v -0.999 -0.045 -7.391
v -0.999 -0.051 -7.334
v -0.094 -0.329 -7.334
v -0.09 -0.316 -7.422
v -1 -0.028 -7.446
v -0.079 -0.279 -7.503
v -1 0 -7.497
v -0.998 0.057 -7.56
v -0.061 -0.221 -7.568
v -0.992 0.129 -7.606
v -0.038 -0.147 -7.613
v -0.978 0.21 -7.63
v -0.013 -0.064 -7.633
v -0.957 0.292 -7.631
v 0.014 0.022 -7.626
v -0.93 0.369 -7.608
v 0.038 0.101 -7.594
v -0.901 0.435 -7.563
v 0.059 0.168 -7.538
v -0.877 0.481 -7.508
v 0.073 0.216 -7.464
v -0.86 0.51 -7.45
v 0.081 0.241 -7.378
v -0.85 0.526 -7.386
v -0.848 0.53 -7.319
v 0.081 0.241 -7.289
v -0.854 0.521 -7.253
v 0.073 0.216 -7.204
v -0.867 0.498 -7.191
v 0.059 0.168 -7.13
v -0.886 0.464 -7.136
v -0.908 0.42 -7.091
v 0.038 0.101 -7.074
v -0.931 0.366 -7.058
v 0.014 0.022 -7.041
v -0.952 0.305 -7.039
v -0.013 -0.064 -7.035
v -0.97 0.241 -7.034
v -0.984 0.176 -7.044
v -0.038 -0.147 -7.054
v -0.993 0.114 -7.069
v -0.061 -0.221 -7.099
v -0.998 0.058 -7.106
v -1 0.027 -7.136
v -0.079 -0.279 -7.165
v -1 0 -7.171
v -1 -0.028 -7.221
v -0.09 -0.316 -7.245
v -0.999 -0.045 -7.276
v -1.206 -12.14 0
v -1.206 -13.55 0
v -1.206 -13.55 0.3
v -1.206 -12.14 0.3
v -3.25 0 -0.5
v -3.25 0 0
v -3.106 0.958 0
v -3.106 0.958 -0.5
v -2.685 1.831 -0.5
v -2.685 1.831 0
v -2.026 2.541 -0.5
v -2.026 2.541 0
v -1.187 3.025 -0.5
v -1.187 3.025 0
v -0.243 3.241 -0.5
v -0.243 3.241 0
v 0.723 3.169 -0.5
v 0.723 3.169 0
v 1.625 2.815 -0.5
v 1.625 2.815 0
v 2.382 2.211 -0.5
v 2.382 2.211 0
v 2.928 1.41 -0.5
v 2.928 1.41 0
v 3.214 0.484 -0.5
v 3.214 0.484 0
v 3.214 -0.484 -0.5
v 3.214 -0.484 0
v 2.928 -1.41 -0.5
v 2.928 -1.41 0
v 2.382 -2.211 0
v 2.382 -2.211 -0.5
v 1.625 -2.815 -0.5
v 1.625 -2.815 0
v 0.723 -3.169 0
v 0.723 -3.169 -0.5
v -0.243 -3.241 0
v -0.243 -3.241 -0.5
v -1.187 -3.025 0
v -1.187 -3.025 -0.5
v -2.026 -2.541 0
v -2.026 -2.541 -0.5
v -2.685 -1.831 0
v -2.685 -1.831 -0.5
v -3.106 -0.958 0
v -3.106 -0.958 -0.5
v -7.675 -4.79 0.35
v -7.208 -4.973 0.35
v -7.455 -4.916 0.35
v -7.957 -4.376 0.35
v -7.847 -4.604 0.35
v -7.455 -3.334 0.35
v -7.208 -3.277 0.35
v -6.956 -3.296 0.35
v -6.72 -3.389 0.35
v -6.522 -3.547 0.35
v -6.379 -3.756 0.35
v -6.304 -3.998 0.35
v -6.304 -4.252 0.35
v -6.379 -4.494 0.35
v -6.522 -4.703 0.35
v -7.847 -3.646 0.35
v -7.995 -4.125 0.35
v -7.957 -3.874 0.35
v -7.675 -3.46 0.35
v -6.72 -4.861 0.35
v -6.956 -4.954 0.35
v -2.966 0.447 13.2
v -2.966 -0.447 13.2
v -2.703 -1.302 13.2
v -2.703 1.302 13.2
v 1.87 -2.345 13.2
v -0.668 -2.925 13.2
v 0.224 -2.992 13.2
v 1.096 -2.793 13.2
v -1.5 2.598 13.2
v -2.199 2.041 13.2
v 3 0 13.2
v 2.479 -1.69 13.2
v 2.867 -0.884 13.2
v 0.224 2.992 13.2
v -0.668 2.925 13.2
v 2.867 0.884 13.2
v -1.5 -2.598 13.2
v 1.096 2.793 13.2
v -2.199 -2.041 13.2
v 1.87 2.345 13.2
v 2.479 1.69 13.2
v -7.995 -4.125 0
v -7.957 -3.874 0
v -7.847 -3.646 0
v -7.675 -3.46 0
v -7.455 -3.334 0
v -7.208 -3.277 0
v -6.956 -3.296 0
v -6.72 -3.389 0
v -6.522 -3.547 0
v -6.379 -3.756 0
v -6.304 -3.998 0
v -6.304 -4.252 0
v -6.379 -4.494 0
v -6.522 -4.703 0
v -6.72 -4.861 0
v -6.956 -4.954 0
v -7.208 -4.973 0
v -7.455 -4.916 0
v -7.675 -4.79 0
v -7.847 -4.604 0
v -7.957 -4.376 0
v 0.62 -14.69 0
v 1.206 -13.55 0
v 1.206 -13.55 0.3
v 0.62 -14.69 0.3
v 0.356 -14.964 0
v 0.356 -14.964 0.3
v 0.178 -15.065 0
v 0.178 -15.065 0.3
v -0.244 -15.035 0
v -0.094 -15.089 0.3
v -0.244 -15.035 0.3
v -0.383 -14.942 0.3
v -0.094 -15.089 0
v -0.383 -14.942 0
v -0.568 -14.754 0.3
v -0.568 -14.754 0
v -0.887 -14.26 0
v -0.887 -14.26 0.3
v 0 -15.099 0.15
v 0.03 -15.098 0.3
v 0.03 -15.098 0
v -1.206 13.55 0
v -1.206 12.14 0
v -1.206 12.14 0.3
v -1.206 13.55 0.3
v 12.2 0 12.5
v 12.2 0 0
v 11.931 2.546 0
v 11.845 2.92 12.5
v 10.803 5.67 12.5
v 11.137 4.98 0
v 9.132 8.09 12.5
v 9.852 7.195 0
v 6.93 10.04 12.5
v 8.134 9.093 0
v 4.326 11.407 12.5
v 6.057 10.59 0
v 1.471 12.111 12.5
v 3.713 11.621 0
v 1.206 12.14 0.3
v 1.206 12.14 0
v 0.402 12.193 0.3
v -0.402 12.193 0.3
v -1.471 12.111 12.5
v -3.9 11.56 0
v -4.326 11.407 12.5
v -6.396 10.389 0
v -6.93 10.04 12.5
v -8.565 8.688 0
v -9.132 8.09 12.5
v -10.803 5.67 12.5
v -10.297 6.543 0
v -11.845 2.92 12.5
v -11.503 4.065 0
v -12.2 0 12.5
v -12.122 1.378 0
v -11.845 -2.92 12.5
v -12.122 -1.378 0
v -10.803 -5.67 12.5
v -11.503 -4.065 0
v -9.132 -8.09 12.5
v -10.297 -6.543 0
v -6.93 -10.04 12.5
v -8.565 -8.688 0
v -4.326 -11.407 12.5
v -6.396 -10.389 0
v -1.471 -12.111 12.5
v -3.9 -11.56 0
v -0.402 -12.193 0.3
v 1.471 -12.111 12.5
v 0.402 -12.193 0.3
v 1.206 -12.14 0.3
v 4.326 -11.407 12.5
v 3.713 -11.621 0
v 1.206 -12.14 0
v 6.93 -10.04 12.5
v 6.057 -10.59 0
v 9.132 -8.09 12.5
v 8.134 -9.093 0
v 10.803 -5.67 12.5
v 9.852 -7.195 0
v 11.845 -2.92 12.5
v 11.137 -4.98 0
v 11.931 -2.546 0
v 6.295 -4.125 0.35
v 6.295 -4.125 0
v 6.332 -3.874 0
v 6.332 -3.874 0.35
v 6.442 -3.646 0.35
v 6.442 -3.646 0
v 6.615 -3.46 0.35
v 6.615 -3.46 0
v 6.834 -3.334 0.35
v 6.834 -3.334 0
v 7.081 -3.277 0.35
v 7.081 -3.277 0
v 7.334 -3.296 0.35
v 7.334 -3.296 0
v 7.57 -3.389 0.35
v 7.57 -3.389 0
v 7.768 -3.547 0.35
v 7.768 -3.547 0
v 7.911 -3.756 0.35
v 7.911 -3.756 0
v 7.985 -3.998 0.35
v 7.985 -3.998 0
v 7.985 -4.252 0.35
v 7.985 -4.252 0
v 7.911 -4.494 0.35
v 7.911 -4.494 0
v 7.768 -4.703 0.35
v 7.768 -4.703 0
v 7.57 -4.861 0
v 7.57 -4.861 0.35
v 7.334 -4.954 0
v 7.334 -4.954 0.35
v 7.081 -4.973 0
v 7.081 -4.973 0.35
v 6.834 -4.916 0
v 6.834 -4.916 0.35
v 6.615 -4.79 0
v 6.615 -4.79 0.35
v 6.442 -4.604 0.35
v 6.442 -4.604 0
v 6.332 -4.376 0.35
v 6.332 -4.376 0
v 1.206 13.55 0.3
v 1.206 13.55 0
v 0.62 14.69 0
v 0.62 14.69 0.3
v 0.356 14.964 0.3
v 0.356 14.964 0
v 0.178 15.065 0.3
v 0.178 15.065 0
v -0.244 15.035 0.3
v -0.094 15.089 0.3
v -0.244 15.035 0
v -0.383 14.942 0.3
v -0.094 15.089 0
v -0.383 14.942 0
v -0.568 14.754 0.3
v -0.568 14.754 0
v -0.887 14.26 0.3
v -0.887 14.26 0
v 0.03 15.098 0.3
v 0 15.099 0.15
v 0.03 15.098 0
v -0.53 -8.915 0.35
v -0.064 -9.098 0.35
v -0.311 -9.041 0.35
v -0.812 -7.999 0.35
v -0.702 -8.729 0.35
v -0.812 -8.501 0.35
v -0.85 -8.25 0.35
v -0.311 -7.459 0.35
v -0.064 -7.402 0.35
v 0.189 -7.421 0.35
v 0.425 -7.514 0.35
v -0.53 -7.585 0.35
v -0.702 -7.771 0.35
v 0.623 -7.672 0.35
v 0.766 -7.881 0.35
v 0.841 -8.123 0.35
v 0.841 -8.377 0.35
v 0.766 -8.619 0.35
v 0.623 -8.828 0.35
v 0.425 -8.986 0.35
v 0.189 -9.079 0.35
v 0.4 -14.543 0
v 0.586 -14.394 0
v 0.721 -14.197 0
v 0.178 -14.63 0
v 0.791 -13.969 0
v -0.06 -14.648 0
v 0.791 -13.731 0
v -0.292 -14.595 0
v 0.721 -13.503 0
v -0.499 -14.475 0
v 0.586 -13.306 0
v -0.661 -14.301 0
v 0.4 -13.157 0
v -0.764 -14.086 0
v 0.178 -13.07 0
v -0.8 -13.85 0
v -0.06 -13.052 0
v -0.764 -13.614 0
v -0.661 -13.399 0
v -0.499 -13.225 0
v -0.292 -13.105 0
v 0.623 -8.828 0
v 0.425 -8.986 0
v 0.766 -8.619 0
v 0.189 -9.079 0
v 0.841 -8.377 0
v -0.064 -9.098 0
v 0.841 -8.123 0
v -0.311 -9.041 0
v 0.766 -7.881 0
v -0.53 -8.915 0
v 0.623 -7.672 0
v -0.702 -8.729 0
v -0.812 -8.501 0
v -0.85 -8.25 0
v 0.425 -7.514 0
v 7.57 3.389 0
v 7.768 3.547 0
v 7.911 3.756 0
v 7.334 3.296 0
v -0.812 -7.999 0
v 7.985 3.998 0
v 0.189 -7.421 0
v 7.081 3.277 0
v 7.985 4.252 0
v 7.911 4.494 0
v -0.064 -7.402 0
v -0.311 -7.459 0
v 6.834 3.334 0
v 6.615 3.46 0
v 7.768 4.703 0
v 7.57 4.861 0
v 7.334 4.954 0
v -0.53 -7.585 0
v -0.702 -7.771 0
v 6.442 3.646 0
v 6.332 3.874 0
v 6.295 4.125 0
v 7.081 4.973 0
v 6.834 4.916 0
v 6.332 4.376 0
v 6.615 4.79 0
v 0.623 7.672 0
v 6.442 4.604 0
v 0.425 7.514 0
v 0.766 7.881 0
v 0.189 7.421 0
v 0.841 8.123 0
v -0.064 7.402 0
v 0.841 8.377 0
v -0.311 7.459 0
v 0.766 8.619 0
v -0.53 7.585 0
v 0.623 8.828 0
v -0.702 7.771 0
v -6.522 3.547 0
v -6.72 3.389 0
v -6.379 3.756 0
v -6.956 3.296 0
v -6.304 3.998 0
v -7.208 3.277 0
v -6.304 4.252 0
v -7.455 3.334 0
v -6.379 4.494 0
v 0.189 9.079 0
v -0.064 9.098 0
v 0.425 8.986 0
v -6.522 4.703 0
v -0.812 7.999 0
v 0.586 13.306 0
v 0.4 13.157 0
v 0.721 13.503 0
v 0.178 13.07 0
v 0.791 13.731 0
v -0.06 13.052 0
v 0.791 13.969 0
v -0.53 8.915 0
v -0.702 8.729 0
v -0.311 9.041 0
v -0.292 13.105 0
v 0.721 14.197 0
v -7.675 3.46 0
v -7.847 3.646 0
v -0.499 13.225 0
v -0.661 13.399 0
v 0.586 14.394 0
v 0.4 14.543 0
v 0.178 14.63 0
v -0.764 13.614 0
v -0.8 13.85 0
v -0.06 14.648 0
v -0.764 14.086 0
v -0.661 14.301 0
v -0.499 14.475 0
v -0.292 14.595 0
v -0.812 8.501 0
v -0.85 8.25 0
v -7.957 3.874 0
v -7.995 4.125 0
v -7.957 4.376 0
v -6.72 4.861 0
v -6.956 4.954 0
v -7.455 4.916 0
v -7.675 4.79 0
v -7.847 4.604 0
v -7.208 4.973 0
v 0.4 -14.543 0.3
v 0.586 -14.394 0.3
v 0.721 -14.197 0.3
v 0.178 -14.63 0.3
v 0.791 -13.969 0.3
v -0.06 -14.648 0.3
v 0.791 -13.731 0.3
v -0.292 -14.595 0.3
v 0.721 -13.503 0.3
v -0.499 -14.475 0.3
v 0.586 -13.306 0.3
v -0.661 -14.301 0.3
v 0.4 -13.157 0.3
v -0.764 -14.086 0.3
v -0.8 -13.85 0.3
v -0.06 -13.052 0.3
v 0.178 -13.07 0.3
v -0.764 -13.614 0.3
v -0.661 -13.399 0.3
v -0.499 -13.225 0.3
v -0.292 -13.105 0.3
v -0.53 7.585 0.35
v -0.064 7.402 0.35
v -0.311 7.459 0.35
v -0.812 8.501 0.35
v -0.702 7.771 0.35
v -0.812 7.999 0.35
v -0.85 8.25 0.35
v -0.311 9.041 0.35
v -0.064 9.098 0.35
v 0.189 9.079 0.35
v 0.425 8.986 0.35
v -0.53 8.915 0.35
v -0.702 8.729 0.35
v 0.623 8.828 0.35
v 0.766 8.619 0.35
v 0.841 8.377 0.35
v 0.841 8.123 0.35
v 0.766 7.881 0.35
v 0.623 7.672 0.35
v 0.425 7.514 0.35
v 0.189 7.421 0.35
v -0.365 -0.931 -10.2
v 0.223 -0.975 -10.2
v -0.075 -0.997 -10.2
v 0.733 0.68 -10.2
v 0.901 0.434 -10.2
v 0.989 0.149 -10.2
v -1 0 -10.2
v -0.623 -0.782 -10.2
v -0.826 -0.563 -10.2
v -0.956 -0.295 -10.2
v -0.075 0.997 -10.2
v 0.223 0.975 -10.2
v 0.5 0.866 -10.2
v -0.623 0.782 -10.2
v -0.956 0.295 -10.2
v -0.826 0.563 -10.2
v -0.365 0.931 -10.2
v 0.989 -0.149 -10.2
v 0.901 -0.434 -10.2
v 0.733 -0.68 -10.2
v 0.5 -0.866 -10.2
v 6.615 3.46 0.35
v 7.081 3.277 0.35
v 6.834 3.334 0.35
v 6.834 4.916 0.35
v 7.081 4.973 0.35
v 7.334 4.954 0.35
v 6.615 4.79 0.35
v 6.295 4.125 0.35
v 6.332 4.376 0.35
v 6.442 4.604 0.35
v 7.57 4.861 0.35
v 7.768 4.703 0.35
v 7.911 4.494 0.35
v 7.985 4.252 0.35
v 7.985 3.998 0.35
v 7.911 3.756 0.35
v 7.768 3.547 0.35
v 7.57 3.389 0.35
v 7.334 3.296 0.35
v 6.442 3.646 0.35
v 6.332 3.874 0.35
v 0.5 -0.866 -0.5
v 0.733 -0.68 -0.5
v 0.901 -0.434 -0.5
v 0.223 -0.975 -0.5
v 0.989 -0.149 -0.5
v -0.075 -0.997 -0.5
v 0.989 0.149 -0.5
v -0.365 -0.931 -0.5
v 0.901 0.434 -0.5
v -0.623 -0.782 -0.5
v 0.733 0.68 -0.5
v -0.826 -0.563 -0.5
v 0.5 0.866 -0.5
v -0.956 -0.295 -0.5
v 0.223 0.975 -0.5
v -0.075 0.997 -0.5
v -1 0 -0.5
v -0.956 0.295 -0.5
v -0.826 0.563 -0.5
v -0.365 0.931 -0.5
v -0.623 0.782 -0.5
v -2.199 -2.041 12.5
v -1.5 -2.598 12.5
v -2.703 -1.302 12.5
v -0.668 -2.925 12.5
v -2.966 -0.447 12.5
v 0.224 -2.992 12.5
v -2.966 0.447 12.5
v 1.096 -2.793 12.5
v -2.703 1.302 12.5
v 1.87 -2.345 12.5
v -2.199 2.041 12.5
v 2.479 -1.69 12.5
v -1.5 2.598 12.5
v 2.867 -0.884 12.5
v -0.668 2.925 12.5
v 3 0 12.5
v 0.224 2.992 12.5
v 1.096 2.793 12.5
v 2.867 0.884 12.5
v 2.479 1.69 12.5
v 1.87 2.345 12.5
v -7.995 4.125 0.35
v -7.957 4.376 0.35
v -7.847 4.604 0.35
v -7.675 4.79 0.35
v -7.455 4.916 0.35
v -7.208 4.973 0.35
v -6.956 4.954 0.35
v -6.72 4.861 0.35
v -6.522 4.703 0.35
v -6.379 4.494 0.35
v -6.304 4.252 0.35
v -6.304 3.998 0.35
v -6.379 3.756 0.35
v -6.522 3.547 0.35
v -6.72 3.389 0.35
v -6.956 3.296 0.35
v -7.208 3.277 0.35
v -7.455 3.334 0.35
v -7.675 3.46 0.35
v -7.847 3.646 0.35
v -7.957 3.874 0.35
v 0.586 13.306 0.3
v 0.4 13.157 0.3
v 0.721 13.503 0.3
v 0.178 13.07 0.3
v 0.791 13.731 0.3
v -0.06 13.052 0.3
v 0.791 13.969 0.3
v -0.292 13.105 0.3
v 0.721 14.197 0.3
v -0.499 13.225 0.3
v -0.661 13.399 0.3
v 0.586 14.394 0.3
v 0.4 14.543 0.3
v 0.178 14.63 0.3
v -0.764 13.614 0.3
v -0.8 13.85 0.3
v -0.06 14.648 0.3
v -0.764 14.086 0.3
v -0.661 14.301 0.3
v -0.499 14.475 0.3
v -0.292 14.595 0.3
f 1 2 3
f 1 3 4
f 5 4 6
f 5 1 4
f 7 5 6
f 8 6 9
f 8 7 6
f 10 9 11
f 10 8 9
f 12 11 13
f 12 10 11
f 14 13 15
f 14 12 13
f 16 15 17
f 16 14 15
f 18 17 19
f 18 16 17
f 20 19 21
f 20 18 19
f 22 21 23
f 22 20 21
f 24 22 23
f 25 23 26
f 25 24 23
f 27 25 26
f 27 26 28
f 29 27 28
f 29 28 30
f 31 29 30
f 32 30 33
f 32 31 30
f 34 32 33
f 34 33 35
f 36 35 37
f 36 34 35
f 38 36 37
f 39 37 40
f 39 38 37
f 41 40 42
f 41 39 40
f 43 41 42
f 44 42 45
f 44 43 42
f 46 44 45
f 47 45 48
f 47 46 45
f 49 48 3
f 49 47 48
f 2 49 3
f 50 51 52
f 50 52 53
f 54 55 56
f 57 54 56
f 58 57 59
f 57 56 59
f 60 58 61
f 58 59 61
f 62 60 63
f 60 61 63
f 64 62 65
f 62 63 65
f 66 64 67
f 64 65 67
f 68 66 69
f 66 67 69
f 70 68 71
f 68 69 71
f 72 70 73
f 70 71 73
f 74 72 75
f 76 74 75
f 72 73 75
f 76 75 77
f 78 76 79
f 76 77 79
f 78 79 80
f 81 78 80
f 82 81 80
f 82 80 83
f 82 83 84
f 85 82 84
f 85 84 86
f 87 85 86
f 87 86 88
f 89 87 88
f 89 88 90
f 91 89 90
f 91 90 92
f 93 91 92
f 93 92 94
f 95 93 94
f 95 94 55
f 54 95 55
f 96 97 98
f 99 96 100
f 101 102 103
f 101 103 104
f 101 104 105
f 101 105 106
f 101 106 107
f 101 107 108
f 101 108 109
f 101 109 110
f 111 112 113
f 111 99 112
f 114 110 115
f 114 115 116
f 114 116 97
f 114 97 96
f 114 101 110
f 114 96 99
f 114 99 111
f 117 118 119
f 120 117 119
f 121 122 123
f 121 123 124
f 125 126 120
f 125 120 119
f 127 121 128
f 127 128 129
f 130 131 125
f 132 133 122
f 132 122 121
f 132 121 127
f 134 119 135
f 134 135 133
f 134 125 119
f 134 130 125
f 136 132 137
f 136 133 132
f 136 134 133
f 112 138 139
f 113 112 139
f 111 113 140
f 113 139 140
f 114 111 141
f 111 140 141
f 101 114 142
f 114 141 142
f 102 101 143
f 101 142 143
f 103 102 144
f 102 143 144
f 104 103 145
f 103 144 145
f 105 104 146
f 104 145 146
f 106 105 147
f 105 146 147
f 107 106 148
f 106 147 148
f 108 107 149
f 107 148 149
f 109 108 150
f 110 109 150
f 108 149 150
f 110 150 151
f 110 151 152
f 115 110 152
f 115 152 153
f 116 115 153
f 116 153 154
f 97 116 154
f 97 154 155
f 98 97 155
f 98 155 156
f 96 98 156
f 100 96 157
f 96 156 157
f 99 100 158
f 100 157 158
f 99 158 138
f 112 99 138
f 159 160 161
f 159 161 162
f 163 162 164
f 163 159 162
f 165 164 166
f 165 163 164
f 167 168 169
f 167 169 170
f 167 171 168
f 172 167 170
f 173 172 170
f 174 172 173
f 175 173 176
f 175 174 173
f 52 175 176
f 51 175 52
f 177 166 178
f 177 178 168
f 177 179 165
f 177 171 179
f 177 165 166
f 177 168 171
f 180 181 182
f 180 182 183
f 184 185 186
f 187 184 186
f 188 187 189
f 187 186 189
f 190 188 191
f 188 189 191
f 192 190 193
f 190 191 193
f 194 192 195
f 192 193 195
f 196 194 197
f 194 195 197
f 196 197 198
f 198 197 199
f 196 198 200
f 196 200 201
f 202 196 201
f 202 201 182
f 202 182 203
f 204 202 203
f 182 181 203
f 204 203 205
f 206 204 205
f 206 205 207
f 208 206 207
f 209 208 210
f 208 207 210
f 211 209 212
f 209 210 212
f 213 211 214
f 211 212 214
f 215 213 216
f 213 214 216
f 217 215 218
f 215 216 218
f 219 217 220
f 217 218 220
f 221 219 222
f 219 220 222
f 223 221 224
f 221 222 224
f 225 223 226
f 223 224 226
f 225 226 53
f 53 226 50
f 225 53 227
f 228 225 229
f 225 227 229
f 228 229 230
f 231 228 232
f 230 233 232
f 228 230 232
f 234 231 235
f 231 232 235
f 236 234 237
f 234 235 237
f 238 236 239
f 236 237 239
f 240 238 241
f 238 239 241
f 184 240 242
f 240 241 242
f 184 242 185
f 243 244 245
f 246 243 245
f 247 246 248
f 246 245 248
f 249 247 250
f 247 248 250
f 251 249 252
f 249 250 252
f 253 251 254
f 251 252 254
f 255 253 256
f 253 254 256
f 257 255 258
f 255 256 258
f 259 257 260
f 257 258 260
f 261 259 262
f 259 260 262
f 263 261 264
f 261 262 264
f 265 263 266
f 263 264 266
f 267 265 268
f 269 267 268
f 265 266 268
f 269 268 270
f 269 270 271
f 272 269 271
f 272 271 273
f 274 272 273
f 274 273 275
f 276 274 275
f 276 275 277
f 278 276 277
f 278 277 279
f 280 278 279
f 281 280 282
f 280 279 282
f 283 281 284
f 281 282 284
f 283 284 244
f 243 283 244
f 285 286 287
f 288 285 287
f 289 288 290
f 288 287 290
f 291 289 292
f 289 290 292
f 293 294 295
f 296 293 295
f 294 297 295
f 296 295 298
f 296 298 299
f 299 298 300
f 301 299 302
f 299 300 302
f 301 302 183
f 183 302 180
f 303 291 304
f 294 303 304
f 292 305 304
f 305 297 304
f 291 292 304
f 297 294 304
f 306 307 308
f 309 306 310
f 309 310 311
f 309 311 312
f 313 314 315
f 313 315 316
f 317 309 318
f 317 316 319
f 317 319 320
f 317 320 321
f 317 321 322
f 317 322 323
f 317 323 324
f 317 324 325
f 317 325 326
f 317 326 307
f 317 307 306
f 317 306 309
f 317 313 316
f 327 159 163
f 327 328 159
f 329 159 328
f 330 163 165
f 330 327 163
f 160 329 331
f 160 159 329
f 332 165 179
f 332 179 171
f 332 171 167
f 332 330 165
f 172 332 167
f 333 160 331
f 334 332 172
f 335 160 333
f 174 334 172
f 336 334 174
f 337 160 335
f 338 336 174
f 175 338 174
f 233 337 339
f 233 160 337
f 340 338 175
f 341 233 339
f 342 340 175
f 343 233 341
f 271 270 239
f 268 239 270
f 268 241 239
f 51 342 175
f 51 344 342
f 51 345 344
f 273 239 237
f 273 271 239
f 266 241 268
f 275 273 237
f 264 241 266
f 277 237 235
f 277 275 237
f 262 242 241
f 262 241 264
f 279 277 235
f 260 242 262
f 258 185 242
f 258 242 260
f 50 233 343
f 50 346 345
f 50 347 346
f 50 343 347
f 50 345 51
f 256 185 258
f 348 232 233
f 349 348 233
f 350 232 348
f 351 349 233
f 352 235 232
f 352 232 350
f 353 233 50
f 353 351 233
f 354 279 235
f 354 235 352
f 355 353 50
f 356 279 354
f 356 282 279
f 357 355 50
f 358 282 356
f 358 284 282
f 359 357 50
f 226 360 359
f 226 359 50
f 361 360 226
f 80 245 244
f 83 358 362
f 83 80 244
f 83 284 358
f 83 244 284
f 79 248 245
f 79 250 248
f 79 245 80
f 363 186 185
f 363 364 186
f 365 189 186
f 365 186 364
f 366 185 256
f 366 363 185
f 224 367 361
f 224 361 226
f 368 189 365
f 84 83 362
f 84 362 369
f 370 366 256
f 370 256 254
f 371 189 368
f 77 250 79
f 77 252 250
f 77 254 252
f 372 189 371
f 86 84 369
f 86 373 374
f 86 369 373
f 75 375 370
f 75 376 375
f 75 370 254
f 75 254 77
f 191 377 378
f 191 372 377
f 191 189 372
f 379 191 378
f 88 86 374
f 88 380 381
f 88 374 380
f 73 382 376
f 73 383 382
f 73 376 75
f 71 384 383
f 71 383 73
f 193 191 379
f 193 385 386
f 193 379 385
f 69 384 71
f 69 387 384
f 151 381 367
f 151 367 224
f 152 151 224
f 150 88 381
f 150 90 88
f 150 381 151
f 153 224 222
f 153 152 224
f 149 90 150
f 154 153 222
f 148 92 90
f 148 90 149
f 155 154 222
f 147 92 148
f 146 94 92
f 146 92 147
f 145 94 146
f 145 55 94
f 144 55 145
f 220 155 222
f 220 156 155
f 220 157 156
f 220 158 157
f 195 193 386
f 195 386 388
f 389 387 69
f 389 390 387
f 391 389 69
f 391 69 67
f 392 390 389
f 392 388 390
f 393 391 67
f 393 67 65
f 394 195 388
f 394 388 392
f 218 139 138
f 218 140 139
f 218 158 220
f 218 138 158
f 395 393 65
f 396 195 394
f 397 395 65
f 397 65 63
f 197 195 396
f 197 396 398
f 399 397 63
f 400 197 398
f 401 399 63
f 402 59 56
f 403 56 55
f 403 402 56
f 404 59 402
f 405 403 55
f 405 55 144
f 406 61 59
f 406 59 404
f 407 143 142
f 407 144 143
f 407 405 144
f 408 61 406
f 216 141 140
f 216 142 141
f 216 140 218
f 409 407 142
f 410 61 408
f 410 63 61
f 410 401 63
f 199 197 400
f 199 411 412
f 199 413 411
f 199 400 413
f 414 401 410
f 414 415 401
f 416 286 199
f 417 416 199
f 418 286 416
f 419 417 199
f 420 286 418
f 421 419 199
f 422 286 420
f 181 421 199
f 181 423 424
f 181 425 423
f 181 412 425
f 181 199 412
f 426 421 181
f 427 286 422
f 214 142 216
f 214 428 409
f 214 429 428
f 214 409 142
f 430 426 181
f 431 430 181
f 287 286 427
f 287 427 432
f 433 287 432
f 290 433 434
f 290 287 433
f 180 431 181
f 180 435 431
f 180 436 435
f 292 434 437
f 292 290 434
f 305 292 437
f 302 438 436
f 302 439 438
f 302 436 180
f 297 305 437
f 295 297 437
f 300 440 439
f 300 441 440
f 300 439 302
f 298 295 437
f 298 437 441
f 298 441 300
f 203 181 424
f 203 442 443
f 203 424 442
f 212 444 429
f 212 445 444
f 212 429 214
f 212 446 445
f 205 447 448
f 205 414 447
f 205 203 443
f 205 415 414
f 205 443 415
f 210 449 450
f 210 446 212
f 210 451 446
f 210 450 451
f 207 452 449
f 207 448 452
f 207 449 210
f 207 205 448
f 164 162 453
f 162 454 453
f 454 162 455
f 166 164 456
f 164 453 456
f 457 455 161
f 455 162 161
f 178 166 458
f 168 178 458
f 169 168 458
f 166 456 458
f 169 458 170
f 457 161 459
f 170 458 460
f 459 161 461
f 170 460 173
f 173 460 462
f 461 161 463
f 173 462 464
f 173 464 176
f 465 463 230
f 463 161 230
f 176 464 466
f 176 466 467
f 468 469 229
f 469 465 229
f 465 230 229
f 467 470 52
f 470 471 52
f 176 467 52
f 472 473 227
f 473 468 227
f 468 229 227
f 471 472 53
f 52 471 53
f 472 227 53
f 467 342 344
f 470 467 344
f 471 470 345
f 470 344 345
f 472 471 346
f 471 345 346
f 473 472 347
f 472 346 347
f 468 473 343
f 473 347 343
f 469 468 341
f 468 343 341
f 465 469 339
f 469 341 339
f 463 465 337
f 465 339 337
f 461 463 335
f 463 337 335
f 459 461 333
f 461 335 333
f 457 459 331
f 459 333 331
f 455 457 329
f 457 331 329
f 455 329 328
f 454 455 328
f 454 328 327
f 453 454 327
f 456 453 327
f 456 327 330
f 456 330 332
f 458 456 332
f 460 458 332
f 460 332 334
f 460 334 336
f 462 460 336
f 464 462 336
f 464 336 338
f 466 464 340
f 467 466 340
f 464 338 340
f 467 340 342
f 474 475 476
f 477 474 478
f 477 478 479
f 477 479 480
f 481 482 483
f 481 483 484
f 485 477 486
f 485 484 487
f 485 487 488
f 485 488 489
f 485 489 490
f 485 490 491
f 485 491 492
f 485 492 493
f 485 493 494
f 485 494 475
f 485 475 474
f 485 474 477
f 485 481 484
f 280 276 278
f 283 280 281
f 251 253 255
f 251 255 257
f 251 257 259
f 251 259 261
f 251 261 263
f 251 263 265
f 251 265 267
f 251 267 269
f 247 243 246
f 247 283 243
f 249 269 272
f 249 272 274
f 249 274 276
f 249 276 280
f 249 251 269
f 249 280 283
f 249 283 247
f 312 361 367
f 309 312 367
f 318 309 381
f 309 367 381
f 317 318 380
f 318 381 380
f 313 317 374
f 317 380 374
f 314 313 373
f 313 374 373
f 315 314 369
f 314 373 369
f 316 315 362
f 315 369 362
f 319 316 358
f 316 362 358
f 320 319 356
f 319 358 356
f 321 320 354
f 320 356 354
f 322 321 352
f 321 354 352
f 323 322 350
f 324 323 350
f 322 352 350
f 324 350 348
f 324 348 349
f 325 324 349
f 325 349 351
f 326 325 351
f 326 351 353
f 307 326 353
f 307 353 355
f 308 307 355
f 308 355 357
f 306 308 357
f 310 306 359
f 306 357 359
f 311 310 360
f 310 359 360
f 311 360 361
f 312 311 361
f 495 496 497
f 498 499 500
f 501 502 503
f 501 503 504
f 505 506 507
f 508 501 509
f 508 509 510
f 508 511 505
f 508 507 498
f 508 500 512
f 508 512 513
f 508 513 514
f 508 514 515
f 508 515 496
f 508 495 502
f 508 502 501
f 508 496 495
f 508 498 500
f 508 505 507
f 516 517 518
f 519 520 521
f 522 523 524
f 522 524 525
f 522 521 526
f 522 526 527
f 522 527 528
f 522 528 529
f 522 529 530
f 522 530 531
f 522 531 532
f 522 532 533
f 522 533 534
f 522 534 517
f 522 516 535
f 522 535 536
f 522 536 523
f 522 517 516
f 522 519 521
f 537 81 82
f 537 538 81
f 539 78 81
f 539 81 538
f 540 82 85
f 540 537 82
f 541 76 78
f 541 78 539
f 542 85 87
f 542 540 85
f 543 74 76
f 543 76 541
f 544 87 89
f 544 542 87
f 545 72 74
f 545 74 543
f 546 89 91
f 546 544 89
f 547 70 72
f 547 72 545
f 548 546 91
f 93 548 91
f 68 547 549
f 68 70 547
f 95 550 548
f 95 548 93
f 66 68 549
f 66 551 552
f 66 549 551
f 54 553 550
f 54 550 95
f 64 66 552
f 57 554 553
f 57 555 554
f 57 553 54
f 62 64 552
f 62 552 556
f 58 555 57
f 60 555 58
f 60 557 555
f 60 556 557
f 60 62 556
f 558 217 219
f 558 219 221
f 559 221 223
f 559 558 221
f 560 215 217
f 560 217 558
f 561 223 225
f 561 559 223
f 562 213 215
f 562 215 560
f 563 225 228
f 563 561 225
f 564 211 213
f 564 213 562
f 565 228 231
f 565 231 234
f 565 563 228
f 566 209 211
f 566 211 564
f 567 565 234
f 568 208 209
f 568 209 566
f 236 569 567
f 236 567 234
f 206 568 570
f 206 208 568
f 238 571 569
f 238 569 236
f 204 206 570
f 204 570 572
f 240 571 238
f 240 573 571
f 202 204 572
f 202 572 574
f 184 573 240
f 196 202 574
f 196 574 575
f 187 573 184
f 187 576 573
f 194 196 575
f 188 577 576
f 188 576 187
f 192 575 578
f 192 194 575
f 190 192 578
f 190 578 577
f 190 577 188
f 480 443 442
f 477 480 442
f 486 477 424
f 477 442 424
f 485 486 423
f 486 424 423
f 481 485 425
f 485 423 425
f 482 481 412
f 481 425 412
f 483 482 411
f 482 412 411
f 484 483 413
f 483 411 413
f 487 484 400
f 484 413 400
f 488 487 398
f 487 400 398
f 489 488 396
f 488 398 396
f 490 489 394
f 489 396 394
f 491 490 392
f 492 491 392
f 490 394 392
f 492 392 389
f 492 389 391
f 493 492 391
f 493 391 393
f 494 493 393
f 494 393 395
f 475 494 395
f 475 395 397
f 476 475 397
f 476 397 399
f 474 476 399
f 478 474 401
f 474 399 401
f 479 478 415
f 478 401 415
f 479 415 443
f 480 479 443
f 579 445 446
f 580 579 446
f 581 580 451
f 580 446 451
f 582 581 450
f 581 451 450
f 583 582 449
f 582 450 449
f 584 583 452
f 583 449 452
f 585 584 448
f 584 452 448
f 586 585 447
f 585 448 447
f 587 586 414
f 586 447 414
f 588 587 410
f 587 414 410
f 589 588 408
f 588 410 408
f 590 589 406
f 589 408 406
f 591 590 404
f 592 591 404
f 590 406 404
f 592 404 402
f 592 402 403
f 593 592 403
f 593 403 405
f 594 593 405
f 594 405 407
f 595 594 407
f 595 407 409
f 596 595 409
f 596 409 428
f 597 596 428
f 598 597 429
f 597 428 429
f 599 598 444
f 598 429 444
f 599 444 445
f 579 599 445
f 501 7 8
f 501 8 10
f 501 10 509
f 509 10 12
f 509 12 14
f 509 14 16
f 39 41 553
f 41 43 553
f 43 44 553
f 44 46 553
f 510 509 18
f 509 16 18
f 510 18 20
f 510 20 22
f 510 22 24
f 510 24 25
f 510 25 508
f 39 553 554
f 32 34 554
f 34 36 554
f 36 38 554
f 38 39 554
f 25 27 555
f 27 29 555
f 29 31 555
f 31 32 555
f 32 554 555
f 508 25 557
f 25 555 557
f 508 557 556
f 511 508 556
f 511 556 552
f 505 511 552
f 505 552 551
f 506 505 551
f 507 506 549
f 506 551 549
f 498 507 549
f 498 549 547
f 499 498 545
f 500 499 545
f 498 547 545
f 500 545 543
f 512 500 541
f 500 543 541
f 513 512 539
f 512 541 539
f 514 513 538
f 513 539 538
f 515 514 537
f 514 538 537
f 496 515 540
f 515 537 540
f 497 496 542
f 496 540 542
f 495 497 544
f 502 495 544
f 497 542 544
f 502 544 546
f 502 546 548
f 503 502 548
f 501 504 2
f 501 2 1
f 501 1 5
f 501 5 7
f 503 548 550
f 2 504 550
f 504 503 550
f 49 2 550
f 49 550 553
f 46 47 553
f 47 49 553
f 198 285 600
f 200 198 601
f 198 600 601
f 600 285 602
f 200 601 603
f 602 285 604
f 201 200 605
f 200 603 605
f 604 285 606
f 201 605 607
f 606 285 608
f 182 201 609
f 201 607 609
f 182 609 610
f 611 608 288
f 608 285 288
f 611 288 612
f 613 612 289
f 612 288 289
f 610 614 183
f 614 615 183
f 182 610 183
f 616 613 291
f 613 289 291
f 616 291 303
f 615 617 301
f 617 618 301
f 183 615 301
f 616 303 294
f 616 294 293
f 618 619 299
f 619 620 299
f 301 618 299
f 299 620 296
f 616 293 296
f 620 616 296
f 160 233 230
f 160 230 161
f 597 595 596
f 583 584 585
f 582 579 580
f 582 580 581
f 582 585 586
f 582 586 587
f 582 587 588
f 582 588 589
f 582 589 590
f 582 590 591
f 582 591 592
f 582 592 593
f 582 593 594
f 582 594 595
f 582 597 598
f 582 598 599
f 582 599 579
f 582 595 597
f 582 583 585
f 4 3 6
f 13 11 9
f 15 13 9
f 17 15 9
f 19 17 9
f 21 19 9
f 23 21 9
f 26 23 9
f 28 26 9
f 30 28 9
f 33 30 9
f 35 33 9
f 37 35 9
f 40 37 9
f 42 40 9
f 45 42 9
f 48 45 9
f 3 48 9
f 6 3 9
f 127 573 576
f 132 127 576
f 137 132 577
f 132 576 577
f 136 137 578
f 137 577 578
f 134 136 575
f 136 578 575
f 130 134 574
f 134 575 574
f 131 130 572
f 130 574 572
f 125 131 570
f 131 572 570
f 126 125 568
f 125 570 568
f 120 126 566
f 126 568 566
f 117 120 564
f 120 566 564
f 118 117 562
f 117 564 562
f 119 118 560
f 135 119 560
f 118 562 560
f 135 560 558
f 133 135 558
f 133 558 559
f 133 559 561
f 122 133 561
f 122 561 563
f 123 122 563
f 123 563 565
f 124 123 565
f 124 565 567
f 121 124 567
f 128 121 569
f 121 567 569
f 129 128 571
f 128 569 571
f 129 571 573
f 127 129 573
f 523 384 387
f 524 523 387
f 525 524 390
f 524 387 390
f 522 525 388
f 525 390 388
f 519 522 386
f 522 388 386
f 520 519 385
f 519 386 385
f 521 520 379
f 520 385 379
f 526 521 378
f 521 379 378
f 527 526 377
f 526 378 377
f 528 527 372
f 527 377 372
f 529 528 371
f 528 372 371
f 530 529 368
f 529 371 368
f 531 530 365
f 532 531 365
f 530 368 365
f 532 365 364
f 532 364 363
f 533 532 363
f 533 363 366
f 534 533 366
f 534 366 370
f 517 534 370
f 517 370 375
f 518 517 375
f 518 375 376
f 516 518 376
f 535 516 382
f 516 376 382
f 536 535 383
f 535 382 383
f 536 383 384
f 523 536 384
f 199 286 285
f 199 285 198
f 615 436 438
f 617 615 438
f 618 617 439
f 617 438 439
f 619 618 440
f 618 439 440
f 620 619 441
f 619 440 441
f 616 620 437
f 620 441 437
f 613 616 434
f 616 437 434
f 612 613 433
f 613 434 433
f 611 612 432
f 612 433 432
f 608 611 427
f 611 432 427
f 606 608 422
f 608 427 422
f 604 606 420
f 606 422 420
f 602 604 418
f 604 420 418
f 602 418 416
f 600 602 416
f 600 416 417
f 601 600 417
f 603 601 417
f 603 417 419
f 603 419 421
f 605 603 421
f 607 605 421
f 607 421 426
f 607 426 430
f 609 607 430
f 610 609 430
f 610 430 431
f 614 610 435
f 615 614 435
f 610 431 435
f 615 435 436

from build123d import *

# Parameters (mm, degrees)
SKETCH_1_R               = 12.2
EXTRUDE_1_DEPTH          = 12.5
SKETCH_2_R               = 3
EXTRUDE_2_DEPTH          = 0.7
SKETCH_3_R               = 3.25
EXTRUDE_3_DEPTH          = 1
SKETCH_4_R               = 1
EXTRUDE_4_DEPTH          = 9.2
SKETCH_5_R               = 0.85
CUT_EXTRUDE_1_DEPTH      = 0.35
SKETCH_9_R               = 0.8
EXTRUDE_7_DEPTH          = 0.3
CUT_EXTRUDE_START        = -0.5
SKETCH_10_R              = 3.25
SKETCH_10_R_2            = 1
CUT_EXTRUDE_3_DEPTH      = 0.5
CUT_EXTRUDE_4_DEPTH      = 2
CUT_EXTRUDE_4_DEPTH_BACK = 0.2
SKETCH_11_R              = 0.3


with BuildPart() as part:
    # 草图1 → 凸台-拉伸1 (new body)
    with BuildSketch(Plane.XY):
        Circle(SKETCH_1_R)
    extrude(amount=EXTRUDE_1_DEPTH)

    # 草图2 → 凸台-拉伸2 (add)
    with BuildSketch(Plane.XY.offset(12.5)):
        Circle(SKETCH_2_R)
    extrude(amount=EXTRUDE_2_DEPTH)

    # 草图3 → 凸台-拉伸3 (add)
    with BuildSketch(Plane(origin=(0, 0, 0), x_dir=(-1, 0, 0), z_dir=(0, 0, -1))):
        Circle(SKETCH_3_R)
    extrude(amount=EXTRUDE_3_DEPTH)

    # 草图4 → 凸台-拉伸4 (add)
    with BuildSketch(Plane(origin=(0, 0, -1), x_dir=(-1, 0, 0), z_dir=(0, 0, -1))):
        Circle(SKETCH_4_R)
    extrude(amount=EXTRUDE_4_DEPTH)

    # 草图5 → 切除-拉伸1 (cut)
    with BuildSketch(Plane(origin=(0, 0, 0), x_dir=(-1, 0, 0), z_dir=(0, 0, -1))):
        with Locations((0, 8.25)):
            Circle(SKETCH_5_R)
        with Locations((7.144709581, 4.125)):
            Circle(SKETCH_5_R)
        with Locations((7.144709581, -4.125)):
            Circle(SKETCH_5_R)
        with Locations((0, -8.25)):
            Circle(SKETCH_5_R)
        with Locations((-7.144709581, -4.125)):
            Circle(SKETCH_5_R)
        with Locations((-7.144709581, 4.125)):
            Circle(SKETCH_5_R)
    extrude(amount=-CUT_EXTRUDE_1_DEPTH, mode=Mode.SUBTRACT)

    # 草图9 → 凸台-拉伸7 (add)
    # profile 1 of 2: a face of its own
    with BuildSketch(Plane(origin=(0, 0, 0), x_dir=(-1, 0, 0), z_dir=(0, 0, -1))):
        with BuildLine():
            Line((-1.205654287, 13.55027997), (-1.205654287, 12.14027997))
            add(Edge.make_bspline(
                [(-1.205654287, 12.14027997), (0, 12.25972003), (1.205654287, 12.14027997)],
                knots=[0, 0, 0, 1, 1, 1], degree=2))
            Line((1.205654287, 12.14027997), (1.205654287, 13.55027997))
            add(Edge.make_bspline(
                [(-1.205654287, 13.55027997), (0, 16.646945855), (1.205654287, 13.55027997)],
                knots=[0, 0, 0, 1, 1, 1], degree=2))
        make_face()
        with Locations((0, 13.85)):
            Circle(SKETCH_9_R, mode=Mode.SUBTRACT)
    # profile 2 of 2: a face of its own
    with BuildSketch(Plane(origin=(0, 0, 0), x_dir=(-1, 0, 0), z_dir=(0, 0, -1))):
        with BuildLine():
            Line((1.205654287, -13.55027997), (1.205654287, -12.14027997))
            add(Edge.make_bspline(
                [(-1.205654287, -12.14027997), (0, -12.25972003), (1.205654287, -12.14027997)],
                knots=[0, 0, 0, 1, 1, 1], degree=2))
            Line((-1.205654287, -12.14027997), (-1.205654287, -13.55027997))
            add(Edge.make_bspline(
                [(-1.205654287, -13.55027997), (0, -16.646945855), (1.205654287, -13.55027997)],
                knots=[0, 0, 0, 1, 1, 1], degree=2))
        make_face()
        with Locations((0, -13.85)):
            Circle(SKETCH_9_R, mode=Mode.SUBTRACT)
    extrude(amount=-EXTRUDE_7_DEPTH)

    # 草图10 → 切除-拉伸3 (cut)
    with BuildSketch(Plane(origin=(0, 0, -1), x_dir=(-1, 0, 0), z_dir=(0, 0, -1)).offset(CUT_EXTRUDE_START)):
        Circle(SKETCH_10_R)
        Circle(SKETCH_10_R_2, mode=Mode.SUBTRACT)
    extrude(amount=CUT_EXTRUDE_3_DEPTH, mode=Mode.SUBTRACT)

    # 草图11 → 切除-拉伸4 (cut, two sides: drawn at the far end of the back side and taken through both)
    with BuildSketch(Plane(origin=(-21.214961085, -62.254689725, -57.176272609), x_dir=(0, 0, 1), z_dir=(0.9558895782864368, -0.2937262571228151, 2.460292199088584e-14)).offset(-CUT_EXTRUDE_4_DEPTH_BACK)):
        with Locations(Location((49.842566165, -65.698034164, 0), (0, 0, 90))):
            Circle(SKETCH_11_R)
    extrude(amount=CUT_EXTRUDE_4_DEPTH + CUT_EXTRUDE_4_DEPTH_BACK, mode=Mode.SUBTRACT)


solid = part.part
